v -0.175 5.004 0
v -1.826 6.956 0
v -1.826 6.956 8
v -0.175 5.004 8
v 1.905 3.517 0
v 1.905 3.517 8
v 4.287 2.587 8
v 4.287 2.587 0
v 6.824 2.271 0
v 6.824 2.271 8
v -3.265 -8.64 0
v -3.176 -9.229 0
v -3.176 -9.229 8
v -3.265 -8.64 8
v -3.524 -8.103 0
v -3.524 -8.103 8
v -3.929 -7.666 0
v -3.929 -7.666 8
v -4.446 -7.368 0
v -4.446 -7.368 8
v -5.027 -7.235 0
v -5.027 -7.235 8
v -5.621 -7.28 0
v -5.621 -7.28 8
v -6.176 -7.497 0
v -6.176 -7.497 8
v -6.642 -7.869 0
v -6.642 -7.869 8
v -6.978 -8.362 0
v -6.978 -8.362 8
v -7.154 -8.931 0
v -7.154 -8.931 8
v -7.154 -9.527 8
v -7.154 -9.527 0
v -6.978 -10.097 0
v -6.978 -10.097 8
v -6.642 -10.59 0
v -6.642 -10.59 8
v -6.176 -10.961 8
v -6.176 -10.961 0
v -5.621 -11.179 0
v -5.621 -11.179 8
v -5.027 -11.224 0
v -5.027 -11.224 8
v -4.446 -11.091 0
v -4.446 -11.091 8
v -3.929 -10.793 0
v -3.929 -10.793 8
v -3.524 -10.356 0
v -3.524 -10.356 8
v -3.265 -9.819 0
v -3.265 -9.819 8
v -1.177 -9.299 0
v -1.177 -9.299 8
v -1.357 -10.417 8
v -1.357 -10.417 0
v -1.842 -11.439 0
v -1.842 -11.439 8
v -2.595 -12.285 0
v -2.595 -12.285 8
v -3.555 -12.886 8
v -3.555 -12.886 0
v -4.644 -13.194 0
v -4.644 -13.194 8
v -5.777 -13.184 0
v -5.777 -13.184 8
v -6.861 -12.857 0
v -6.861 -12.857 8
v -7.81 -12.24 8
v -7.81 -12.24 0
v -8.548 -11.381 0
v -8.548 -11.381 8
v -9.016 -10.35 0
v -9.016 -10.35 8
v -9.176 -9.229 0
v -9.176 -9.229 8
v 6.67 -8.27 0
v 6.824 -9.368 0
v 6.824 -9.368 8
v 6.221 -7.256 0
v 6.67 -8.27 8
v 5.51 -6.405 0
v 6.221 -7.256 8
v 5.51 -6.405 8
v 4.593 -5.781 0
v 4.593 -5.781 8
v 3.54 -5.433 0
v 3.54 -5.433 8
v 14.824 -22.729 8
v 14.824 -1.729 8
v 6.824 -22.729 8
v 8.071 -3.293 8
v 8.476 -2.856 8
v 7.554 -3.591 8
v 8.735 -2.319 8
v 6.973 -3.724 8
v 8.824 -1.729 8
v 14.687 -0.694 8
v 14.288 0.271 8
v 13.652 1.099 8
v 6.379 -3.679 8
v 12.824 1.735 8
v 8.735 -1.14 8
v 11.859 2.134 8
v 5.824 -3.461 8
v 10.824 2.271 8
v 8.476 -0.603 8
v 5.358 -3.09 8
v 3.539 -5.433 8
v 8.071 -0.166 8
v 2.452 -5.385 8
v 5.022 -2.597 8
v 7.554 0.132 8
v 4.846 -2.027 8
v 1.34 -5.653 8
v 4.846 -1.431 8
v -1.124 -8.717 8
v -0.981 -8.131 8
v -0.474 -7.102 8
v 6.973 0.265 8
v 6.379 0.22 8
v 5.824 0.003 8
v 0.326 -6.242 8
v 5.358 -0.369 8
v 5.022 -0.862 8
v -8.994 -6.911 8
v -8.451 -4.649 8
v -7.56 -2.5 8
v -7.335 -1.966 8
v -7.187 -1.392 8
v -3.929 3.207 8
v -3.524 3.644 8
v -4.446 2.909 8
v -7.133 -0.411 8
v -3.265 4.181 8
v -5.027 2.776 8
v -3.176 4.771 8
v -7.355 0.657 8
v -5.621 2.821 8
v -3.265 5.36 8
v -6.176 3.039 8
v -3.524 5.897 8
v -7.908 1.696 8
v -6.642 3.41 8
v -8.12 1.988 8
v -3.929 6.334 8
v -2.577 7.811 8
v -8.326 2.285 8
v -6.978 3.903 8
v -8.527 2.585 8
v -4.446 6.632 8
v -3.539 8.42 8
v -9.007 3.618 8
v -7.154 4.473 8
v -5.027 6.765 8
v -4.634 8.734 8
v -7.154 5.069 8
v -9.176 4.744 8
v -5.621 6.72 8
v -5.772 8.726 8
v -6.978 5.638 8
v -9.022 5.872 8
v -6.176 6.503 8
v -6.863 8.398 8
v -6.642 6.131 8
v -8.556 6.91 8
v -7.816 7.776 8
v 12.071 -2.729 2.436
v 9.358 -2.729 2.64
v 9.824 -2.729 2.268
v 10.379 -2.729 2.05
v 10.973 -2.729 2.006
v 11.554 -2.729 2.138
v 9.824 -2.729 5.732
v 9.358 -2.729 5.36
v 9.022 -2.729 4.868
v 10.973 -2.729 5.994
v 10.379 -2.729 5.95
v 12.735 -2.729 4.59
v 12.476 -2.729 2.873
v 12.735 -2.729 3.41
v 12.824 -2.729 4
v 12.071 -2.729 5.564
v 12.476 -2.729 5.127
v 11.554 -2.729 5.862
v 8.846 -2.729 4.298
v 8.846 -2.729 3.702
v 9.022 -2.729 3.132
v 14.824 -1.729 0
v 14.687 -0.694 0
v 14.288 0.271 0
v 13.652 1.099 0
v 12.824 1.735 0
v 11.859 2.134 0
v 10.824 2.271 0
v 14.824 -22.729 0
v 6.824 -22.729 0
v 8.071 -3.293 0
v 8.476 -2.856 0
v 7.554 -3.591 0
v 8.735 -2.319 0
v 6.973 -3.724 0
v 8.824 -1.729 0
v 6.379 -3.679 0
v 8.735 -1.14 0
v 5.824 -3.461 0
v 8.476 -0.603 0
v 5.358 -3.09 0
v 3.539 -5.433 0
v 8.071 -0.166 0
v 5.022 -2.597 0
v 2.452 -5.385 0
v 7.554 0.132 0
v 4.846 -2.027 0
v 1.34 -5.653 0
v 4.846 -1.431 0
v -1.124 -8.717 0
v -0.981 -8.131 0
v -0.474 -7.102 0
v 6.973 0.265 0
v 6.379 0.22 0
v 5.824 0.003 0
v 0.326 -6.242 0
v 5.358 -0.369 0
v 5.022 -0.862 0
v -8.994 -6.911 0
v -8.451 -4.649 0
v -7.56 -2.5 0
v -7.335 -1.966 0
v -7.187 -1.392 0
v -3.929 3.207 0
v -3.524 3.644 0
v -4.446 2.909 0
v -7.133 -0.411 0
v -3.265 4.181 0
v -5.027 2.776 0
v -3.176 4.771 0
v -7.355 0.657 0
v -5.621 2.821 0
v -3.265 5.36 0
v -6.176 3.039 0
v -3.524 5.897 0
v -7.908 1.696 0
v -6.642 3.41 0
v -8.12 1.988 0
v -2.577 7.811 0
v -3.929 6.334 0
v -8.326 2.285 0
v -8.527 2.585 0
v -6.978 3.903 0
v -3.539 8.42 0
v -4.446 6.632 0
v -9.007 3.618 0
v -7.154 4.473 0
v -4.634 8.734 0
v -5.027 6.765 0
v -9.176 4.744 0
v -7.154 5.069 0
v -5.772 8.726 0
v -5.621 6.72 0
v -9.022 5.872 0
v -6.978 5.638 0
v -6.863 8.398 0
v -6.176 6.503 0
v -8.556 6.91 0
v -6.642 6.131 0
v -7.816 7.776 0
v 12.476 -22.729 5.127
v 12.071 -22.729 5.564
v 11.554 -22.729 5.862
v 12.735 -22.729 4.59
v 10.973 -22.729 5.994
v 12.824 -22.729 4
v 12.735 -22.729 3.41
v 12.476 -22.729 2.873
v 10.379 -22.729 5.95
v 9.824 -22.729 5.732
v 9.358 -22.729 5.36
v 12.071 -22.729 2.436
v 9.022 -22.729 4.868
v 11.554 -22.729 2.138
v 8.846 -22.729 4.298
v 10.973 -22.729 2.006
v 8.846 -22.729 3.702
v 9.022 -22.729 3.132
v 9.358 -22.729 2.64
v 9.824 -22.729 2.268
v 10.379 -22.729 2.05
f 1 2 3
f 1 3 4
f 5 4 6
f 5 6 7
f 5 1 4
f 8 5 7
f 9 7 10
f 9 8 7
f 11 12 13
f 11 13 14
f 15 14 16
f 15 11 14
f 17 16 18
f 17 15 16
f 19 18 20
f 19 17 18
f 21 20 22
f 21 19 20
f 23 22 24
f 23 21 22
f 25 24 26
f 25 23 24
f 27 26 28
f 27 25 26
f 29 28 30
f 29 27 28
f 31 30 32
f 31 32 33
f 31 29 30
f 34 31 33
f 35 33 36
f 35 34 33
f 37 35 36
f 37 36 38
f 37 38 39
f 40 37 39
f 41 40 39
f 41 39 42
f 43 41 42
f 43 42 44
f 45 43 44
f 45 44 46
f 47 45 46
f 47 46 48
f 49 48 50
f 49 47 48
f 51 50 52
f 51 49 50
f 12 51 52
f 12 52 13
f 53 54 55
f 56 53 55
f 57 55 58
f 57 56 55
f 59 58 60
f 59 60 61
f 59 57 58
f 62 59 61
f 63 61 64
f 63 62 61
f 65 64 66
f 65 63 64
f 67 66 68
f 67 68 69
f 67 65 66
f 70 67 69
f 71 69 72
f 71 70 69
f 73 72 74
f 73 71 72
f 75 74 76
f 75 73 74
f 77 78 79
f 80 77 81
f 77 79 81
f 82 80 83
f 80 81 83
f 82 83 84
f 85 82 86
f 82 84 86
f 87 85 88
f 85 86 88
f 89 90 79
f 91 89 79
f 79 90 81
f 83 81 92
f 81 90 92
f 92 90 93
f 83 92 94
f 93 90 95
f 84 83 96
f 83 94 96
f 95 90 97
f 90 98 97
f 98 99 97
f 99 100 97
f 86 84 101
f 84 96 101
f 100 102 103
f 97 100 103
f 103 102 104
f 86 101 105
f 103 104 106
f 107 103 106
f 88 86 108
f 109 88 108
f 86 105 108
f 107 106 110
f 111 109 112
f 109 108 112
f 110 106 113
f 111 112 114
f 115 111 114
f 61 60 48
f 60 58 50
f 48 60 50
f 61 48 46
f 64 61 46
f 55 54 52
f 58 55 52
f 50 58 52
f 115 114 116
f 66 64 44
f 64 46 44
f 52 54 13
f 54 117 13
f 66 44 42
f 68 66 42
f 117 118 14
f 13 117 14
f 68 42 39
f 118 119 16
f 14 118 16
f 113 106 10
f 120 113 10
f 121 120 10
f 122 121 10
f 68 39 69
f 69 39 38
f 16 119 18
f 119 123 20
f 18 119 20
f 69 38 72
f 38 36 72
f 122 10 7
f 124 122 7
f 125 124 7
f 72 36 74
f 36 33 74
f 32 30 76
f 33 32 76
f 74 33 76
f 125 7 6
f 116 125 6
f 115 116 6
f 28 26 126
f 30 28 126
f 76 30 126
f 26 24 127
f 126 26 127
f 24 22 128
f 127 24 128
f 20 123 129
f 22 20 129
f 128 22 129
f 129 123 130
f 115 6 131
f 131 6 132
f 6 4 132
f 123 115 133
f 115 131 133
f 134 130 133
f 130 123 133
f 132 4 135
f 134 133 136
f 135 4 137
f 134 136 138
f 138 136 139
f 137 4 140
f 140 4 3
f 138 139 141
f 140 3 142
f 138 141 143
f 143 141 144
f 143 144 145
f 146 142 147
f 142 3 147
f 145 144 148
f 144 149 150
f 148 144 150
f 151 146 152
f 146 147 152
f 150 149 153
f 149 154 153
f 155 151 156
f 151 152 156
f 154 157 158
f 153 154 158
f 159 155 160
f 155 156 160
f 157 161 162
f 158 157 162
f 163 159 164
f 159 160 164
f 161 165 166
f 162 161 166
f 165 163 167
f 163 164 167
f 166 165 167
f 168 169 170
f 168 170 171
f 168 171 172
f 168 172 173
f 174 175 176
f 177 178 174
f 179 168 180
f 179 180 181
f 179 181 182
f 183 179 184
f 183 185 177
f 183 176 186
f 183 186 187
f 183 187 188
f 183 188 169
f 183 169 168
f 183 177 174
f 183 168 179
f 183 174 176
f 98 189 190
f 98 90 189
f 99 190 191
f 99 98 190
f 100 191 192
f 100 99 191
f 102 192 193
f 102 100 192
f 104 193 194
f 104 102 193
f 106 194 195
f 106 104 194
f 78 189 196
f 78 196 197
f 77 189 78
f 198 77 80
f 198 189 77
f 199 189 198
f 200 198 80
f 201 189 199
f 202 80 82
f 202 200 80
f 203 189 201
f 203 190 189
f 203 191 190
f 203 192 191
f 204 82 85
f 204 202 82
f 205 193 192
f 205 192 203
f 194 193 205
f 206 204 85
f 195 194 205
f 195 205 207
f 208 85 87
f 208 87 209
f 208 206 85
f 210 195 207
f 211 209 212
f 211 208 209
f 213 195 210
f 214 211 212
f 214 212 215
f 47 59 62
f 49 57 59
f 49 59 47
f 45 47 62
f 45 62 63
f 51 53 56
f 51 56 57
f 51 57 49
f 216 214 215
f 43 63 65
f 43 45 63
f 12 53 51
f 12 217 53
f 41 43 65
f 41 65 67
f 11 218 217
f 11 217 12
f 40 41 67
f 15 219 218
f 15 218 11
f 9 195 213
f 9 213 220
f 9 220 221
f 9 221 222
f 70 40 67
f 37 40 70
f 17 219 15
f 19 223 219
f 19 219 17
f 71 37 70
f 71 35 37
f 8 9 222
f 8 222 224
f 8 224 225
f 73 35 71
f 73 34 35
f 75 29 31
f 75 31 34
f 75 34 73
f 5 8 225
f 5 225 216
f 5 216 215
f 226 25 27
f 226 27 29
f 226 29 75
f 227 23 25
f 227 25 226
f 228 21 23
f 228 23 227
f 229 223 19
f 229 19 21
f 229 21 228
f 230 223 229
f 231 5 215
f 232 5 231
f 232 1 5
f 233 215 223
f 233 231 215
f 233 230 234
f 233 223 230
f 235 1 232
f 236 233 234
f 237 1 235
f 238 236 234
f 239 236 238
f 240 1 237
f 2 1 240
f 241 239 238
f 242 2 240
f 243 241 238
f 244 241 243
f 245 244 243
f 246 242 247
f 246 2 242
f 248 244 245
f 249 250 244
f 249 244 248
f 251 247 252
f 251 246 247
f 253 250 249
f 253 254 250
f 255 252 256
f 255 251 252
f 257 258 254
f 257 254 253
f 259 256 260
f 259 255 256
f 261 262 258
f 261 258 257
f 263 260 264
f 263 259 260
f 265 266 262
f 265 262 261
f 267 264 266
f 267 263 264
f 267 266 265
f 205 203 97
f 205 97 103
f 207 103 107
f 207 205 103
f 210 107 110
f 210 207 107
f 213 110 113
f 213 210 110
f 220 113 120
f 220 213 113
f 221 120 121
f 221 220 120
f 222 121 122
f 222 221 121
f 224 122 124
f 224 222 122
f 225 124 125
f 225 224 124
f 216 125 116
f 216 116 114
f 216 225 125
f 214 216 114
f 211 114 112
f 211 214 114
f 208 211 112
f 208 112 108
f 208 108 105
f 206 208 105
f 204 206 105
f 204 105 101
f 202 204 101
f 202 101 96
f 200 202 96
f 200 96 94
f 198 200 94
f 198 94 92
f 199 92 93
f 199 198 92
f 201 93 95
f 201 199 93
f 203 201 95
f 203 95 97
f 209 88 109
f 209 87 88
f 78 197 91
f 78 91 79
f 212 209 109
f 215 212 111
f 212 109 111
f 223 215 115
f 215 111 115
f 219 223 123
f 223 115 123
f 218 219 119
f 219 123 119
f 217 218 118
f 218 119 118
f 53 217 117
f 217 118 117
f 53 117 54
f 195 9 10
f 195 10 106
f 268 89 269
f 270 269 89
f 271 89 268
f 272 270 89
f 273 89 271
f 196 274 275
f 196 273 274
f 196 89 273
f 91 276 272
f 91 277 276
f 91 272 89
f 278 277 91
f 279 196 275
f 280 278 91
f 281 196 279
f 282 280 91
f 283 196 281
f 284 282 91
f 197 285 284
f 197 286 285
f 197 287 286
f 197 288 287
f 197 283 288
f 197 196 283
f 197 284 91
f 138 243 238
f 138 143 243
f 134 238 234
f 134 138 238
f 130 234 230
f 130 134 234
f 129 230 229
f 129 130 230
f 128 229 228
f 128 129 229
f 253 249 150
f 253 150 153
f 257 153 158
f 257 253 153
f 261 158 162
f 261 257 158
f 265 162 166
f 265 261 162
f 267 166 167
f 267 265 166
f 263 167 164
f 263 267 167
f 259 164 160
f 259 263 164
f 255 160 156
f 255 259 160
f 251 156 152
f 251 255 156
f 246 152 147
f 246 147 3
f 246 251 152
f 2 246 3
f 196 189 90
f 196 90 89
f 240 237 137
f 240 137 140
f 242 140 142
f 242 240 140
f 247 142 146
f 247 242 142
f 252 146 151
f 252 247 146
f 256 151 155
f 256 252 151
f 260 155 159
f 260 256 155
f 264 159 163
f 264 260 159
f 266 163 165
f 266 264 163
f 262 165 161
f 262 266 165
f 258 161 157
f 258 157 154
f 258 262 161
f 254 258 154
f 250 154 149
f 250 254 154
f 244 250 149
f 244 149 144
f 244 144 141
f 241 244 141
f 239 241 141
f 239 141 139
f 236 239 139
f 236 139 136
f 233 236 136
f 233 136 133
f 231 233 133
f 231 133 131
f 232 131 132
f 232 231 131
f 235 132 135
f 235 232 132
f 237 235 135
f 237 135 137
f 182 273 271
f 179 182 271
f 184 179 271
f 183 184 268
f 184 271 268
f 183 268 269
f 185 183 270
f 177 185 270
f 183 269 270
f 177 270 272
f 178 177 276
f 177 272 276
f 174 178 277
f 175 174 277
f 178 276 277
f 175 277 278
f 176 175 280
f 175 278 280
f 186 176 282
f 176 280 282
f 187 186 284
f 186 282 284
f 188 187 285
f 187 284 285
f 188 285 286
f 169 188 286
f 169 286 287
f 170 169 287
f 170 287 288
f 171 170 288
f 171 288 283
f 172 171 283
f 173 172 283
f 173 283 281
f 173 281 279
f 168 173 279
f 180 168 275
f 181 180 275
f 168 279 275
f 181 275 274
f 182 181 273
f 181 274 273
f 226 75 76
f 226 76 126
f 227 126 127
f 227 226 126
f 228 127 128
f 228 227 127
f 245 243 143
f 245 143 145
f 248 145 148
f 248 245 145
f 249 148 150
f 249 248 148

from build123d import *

# Parameters (mm, degrees)
ESQUISSE1_R             = 2
BOSS_EXTRU_1_DEPTH      = 8
ESQUISSE2_R             = 2
ENL_V_MAT_EXTRU_1_DEPTH = 20
CONG_1_R                = 4


with BuildPart() as part:
    # Esquisse1 → Boss.-Extru.1 (new body)
    with BuildSketch(Plane.XY):
        with BuildLine():
            Line((14.823672032, -22.72937471), (6.823672032, -22.72937471))
            Line((6.823672032, -22.72937471), (6.823672032, -5.72937471))
            ThreePointArc((6.823672032, -5.72937471), (3.664545235, -5.455042233), (0.599995261, -4.640257669))
            ThreePointArc((0.599995261, -4.640257669), (-0.7167539, -6.768921529), (-1.176327968, -9.22937471))
            ThreePointArc((-1.176327968, -9.22937471), (-5.176327968, -13.22937471), (-9.176327968, -9.22937471))
            ThreePointArc((-9.176327968, -9.22937471), (-8.40967046, -4.525117147), (-6.189038967, -0.307701027))
            ThreePointArc((-6.189038967, -0.307701027), (-7.431435725, 1.079388257), (-8.526663538, 2.58539039))
            ThreePointArc((-8.526663538, 2.58539039), (-7.361562867, 8.12096086), (-1.825992398, 6.955860189))
            ThreePointArc((-1.825992398, 6.955860189), (1.905132594, 3.517167866), (6.823672032, 2.27062529))
            Line((6.823672032, 2.27062529), (14.823672032, 2.27062529))
            Line((14.823672032, 2.27062529), (14.823672032, -22.72937471))
        make_face()
        with Locations((-5.176327968, 4.77062529)):
            Circle(ESQUISSE1_R, mode=Mode.SUBTRACT)
        with Locations((6.823672032, -1.72937471)):
            Circle(ESQUISSE1_R, mode=Mode.SUBTRACT)
        with Locations((-5.176327968, -9.22937471)):
            Circle(ESQUISSE1_R, mode=Mode.SUBTRACT)
    extrude(amount=BOSS_EXTRU_1_DEPTH)

    # Esquisse2 → Enlèv. mat.-Extru.1 (cut)
    with BuildSketch(Plane.XZ.offset(22.72937471)):
        with Locations((10.823672032, 4)):
            Circle(ESQUISSE2_R)
    extrude(amount=-ENL_V_MAT_EXTRU_1_DEPTH, mode=Mode.SUBTRACT)

    # Congé1
    cong_1_edges = [part.edges().sort_by_distance(p)[0] for p in [
        (-6.189038967, -0.307701027, 4),
        (0.599995261, -4.640257669, 4),
        (6.823672032, -5.72937471, 4),
        (14.823672032, 2.27062529, 4),
    ]]
    fillet(cong_1_edges, radius=CONG_1_R)


solid = part.part
